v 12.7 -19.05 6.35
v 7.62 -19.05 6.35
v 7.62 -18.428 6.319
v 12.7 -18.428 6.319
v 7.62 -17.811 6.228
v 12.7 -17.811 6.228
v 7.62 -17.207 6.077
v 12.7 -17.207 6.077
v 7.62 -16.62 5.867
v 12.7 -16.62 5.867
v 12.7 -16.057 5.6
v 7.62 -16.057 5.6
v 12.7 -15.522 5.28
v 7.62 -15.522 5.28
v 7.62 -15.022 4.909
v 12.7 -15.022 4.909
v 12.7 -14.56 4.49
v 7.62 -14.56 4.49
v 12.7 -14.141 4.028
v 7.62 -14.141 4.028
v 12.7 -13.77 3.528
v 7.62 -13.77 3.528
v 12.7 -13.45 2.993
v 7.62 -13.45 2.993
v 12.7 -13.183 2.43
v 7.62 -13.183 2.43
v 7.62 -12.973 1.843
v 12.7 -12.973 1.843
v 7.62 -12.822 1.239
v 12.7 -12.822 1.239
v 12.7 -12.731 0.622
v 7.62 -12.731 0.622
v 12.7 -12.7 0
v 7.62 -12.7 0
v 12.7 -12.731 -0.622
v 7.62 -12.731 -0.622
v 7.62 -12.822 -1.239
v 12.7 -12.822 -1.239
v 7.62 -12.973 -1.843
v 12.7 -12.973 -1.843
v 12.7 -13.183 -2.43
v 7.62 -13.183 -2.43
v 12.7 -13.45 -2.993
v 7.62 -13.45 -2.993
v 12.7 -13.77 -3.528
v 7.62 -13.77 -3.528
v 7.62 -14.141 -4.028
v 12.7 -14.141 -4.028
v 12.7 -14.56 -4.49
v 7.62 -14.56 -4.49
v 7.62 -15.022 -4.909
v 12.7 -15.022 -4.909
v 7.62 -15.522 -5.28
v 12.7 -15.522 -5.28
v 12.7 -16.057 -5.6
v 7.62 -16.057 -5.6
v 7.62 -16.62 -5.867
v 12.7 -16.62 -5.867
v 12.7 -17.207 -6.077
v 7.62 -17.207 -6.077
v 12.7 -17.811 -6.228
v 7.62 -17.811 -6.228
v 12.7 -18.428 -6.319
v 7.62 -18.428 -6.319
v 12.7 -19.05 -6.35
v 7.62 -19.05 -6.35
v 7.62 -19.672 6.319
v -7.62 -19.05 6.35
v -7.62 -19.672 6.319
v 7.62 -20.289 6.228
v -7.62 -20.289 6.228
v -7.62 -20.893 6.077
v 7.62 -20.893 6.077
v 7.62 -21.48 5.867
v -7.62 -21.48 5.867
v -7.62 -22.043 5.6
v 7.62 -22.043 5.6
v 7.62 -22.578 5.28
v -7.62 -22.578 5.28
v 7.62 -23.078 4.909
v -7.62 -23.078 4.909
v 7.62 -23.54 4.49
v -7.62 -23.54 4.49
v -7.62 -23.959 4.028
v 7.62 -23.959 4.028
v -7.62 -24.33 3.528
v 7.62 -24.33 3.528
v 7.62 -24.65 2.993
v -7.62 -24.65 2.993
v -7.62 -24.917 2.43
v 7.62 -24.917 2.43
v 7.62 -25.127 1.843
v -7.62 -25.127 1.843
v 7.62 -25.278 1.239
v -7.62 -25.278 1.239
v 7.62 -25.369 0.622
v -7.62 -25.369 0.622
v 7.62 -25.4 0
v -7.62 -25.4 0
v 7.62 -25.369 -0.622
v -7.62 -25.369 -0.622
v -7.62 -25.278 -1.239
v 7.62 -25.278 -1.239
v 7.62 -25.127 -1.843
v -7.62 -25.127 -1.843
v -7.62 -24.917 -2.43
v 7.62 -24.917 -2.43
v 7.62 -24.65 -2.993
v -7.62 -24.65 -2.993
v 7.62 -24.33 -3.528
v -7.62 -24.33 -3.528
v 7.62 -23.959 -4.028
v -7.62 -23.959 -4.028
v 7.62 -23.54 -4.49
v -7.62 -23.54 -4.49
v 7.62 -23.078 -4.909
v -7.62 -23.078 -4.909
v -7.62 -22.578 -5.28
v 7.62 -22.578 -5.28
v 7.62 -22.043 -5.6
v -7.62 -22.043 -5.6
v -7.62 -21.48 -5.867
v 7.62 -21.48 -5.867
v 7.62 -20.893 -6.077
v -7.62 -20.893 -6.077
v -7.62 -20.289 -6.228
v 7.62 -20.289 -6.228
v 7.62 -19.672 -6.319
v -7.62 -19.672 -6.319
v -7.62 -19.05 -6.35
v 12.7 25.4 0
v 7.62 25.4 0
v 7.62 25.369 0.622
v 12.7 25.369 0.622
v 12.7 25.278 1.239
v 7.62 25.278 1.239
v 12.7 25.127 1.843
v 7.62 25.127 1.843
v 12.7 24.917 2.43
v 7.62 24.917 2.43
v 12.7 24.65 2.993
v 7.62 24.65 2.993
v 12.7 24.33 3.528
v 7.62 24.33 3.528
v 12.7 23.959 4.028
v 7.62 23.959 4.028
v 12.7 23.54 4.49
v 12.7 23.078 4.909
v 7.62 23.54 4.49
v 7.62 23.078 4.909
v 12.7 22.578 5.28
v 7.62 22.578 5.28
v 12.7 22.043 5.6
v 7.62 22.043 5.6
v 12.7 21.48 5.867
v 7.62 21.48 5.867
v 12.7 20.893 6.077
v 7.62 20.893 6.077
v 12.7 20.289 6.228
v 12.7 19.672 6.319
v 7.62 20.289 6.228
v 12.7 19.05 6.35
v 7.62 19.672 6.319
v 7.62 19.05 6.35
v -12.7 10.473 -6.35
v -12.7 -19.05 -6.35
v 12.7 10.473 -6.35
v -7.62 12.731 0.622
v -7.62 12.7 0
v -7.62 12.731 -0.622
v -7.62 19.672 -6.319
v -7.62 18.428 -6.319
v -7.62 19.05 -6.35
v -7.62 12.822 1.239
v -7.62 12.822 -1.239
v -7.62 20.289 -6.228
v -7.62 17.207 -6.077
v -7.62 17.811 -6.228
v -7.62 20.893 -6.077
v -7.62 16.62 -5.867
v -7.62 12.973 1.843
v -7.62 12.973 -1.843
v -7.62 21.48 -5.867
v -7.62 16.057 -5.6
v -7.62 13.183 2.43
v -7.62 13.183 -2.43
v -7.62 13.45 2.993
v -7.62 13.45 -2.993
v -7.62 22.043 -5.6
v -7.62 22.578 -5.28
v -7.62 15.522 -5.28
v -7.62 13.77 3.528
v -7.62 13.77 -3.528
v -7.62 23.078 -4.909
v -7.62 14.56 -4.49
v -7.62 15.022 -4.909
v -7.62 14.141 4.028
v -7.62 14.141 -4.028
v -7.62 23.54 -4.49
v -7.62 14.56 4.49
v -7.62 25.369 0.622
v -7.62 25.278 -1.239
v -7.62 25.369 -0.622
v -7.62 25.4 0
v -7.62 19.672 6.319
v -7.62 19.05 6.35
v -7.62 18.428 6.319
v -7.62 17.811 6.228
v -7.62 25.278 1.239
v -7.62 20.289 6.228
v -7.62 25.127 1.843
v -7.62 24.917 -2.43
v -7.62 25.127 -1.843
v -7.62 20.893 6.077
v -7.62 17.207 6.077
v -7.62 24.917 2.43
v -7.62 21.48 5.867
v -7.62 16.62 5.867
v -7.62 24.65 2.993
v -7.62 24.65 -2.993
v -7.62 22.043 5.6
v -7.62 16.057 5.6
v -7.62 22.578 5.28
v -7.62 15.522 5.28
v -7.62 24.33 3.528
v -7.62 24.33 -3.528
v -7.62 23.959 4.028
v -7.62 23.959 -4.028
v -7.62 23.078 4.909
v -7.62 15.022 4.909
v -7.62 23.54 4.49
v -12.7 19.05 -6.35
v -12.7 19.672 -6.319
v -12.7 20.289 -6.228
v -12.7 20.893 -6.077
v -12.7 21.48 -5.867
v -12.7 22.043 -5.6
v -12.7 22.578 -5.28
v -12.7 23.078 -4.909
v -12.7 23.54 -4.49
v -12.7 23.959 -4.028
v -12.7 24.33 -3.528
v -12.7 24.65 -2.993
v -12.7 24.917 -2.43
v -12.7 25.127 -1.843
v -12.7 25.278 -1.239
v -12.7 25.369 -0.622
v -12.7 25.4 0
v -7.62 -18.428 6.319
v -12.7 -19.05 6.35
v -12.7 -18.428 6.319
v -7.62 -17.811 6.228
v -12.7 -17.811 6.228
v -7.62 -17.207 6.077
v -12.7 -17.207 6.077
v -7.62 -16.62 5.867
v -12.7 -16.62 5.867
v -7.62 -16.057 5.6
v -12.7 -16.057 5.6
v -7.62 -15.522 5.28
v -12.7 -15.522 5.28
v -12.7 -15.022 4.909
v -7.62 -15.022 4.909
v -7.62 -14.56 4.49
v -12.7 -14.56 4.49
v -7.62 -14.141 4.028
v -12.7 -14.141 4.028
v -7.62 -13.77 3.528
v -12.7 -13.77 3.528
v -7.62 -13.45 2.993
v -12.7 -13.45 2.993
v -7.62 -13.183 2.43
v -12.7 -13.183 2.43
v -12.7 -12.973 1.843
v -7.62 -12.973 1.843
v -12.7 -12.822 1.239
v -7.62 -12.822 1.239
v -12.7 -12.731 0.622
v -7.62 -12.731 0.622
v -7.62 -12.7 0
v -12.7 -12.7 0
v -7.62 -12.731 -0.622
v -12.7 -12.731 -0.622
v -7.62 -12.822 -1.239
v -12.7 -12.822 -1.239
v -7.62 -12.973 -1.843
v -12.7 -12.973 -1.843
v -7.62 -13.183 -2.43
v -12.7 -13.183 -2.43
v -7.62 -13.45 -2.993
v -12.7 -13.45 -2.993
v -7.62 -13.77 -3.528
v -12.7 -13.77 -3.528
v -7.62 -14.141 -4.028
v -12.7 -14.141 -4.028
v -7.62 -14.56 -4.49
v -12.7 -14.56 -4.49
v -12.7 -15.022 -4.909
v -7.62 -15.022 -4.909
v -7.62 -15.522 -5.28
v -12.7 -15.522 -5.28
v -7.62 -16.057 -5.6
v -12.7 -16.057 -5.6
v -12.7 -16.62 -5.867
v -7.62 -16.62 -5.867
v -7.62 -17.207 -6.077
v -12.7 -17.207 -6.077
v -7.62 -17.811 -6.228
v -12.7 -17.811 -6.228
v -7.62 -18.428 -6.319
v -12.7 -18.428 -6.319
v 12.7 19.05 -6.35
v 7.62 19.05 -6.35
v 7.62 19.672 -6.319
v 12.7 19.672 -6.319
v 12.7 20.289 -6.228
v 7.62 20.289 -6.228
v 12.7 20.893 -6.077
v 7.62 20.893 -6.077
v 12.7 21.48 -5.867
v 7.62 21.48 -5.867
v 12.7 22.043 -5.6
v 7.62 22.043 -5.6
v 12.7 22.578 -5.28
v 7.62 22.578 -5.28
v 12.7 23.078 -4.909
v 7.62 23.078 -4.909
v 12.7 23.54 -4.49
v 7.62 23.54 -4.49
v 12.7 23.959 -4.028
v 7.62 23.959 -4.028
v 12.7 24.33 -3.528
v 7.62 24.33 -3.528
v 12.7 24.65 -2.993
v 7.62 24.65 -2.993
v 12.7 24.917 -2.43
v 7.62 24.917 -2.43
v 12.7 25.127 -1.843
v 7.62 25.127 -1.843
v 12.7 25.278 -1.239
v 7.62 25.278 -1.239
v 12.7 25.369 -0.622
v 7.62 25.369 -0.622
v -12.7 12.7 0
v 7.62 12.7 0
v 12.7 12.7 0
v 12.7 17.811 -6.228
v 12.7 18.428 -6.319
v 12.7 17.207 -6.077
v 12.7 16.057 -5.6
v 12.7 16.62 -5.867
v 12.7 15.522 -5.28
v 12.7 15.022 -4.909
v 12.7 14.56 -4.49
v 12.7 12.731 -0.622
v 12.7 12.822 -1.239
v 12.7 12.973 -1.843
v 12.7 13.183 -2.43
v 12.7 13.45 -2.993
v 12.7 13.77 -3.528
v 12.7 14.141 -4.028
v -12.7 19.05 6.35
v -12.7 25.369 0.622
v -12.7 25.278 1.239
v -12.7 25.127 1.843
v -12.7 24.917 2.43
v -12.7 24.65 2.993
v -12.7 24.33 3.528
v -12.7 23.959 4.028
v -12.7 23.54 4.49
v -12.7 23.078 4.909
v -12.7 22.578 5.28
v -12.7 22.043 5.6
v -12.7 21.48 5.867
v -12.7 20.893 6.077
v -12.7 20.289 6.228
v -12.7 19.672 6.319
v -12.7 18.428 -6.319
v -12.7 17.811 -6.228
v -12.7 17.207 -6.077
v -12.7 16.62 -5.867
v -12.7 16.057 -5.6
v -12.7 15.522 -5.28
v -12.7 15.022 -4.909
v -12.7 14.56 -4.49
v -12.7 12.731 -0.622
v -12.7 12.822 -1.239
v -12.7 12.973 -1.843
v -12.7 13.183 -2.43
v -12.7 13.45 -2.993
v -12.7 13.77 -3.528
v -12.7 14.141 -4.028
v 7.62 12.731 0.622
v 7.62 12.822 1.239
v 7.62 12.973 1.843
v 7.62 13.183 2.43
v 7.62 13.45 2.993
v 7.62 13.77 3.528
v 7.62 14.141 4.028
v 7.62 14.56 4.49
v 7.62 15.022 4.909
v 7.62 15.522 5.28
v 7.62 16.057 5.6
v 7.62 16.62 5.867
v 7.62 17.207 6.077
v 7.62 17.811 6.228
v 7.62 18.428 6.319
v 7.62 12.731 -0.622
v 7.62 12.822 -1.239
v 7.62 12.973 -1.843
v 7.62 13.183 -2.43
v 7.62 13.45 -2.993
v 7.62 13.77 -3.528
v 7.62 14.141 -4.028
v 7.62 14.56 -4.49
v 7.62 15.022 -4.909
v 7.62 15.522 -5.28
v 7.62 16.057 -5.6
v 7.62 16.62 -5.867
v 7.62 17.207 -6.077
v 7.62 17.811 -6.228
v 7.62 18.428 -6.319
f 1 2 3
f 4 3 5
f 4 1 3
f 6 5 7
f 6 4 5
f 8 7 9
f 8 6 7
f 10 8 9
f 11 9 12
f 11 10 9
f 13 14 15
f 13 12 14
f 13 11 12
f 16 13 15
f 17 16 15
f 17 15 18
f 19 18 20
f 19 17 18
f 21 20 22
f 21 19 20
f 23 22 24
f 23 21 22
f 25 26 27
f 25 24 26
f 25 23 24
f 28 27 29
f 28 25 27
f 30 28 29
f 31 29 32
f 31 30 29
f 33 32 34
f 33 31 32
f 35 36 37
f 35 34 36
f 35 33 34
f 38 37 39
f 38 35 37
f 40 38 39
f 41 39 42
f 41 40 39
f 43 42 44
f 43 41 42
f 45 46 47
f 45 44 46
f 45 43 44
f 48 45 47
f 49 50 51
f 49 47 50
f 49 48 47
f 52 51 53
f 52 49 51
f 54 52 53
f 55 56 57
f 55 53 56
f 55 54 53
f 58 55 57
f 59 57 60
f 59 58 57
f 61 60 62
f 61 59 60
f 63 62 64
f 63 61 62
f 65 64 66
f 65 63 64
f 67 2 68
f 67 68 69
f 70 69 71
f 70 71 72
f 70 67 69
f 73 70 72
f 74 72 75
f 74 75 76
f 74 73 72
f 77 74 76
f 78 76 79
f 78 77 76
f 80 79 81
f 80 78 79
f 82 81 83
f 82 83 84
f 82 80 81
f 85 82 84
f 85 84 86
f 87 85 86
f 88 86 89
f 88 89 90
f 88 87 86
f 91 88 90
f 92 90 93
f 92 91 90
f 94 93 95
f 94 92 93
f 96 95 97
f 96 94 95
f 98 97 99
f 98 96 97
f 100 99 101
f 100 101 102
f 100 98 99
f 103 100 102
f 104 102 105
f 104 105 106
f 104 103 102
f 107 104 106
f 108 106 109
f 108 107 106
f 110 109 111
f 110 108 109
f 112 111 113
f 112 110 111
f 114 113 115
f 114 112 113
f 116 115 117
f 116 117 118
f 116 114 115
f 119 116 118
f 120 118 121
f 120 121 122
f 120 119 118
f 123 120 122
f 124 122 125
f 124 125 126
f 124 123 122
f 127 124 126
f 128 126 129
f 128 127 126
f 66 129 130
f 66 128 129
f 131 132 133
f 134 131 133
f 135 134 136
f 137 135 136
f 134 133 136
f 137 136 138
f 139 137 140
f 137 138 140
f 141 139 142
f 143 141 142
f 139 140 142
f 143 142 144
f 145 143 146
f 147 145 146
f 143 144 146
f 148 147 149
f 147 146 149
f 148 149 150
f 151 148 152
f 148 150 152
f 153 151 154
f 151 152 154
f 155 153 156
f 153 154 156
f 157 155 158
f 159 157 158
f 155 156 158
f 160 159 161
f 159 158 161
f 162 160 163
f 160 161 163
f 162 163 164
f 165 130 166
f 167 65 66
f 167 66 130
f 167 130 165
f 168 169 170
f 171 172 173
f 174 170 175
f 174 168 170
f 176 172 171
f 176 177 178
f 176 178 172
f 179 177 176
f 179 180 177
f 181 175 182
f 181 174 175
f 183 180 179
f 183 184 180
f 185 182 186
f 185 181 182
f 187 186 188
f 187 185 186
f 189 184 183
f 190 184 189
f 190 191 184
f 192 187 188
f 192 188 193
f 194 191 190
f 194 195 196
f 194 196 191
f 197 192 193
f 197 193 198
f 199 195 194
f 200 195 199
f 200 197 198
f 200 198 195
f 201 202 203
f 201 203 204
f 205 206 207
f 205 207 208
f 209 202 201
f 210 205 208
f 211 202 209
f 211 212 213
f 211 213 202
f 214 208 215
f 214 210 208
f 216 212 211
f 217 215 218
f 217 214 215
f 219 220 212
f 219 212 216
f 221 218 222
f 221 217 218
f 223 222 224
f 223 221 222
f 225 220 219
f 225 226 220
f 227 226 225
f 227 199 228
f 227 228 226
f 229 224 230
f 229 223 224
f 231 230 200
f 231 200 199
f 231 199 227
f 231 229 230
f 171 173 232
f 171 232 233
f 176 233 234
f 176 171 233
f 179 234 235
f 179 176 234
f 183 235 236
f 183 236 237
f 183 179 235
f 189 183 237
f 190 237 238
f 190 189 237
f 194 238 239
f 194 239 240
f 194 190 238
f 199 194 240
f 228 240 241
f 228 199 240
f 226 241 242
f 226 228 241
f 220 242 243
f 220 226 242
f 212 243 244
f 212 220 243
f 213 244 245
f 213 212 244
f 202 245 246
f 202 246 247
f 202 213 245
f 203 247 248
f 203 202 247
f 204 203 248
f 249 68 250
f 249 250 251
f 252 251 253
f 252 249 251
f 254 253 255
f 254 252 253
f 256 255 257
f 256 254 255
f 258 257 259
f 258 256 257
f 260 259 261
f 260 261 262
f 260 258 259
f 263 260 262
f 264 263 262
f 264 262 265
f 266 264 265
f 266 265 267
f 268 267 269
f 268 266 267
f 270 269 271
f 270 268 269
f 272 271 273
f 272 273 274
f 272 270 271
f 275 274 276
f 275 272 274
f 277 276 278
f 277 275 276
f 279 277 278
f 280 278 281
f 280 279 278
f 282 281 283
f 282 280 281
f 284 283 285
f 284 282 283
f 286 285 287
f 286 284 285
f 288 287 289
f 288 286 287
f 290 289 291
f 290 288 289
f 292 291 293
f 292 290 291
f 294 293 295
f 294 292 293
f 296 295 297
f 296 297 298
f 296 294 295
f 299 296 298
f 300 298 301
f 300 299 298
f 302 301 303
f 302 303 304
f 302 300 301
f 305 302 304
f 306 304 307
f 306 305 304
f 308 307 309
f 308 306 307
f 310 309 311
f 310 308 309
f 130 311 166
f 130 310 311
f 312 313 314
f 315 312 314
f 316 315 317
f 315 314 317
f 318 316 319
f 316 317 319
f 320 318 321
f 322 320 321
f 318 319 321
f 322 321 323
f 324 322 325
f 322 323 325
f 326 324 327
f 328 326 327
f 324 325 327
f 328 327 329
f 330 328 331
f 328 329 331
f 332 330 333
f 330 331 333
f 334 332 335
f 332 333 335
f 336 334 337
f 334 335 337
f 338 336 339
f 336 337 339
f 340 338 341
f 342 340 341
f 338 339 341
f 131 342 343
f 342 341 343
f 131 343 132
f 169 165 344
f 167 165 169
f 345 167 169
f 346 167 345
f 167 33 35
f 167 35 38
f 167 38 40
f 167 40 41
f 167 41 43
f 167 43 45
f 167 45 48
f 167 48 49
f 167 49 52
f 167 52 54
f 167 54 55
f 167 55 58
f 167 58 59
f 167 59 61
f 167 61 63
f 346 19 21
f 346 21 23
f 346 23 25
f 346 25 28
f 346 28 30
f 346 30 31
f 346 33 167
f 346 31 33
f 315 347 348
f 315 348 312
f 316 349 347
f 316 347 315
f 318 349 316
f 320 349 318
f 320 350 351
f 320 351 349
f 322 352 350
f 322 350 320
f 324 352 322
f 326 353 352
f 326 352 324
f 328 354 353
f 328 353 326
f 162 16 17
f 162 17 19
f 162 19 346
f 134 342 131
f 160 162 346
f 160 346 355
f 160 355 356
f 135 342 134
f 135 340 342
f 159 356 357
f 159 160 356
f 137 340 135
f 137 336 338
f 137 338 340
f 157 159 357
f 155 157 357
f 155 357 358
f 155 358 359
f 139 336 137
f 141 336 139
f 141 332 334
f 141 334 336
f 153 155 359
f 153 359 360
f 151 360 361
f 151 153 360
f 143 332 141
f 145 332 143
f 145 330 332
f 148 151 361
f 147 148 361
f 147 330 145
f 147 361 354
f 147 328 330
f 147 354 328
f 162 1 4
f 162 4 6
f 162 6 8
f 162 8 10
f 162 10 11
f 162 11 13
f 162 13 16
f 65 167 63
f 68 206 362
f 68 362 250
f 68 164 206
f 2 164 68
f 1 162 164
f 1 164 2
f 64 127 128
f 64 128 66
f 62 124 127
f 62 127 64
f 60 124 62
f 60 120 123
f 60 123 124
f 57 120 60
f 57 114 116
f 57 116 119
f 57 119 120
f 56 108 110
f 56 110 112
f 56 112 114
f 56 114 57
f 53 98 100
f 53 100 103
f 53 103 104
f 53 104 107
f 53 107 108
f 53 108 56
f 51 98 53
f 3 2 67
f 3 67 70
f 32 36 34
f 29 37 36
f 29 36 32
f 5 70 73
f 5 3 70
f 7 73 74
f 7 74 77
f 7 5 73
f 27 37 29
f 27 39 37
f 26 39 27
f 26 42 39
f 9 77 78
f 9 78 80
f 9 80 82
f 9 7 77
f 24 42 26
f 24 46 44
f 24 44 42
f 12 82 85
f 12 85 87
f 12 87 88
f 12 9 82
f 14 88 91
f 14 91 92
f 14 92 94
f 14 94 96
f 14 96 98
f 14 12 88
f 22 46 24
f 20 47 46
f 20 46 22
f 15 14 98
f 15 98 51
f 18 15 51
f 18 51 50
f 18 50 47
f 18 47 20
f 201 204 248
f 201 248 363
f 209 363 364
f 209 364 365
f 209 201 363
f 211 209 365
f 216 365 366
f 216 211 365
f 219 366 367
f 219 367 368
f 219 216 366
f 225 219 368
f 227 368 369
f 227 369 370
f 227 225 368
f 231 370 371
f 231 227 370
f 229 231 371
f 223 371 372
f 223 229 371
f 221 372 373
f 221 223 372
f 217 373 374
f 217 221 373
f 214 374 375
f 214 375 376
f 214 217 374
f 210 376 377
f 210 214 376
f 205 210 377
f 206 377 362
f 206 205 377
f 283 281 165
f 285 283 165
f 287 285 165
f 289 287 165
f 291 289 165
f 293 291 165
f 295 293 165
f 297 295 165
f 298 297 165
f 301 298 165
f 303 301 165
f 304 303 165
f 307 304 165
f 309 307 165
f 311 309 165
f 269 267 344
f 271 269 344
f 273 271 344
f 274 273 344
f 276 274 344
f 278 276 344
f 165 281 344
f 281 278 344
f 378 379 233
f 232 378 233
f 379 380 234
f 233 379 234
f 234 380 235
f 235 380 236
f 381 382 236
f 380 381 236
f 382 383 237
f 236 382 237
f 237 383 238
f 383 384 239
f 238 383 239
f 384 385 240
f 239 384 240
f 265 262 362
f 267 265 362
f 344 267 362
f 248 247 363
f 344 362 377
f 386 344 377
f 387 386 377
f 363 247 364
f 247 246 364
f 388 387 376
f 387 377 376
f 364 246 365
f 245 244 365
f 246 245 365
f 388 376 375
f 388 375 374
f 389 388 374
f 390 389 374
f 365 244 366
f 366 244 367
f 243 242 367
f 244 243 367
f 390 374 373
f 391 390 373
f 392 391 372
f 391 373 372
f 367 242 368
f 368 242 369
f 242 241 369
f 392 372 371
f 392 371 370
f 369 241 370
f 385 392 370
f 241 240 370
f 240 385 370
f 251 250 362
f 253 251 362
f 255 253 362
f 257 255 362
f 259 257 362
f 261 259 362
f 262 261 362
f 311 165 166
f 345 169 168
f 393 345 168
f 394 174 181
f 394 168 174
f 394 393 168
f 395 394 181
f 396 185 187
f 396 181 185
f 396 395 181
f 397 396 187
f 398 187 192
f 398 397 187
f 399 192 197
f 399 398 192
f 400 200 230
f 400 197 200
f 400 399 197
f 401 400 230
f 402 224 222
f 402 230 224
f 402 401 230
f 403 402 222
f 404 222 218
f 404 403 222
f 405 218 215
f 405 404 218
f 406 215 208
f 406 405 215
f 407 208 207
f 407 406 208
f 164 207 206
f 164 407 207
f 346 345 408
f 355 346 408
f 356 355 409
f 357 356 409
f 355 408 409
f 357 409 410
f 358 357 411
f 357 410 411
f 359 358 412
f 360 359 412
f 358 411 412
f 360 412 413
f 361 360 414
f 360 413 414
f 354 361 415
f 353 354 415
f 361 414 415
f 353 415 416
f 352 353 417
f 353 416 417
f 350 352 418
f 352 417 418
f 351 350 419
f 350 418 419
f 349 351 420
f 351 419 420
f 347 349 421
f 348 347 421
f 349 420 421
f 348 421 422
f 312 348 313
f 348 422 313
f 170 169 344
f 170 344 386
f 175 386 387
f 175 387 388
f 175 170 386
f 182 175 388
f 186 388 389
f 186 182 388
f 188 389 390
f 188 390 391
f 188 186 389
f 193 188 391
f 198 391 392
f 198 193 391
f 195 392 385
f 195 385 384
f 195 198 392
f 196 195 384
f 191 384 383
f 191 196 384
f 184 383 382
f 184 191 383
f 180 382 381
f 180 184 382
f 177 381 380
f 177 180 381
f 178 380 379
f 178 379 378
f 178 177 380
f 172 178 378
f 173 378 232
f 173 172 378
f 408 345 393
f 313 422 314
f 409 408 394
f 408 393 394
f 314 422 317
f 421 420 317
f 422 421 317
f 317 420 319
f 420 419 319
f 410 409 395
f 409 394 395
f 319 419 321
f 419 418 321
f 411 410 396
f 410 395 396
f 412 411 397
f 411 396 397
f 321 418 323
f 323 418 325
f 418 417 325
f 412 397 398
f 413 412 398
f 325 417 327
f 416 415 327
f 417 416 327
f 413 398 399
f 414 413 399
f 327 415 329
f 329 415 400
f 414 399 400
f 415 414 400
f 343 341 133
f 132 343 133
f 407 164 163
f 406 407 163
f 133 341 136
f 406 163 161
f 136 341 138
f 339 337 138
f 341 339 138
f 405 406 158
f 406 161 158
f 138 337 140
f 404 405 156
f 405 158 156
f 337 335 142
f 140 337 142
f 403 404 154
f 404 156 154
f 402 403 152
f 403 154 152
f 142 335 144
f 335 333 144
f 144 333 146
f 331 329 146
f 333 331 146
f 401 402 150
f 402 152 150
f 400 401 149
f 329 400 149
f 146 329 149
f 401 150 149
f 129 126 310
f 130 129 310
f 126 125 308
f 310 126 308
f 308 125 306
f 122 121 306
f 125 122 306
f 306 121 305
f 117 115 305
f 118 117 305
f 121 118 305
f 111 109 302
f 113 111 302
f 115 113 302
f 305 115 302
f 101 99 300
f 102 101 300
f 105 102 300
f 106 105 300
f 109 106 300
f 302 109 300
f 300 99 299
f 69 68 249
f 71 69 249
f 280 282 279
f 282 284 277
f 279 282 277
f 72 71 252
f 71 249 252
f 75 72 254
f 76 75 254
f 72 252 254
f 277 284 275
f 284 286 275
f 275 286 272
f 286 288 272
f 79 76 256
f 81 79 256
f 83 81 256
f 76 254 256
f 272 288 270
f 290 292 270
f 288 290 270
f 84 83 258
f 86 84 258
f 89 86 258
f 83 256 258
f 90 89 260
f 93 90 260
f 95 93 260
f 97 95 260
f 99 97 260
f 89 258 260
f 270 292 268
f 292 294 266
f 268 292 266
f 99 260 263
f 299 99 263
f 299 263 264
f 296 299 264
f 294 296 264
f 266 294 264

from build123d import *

# Parameters (mm, degrees)
F1_DEPTH = 12.7
F2_START = 7.62
F2_DEPTH = 5.08
F3_START = -7.62
F3_DEPTH = 5.08
F4_DEPTH = 7.62


with BuildPart() as f1:
    # F0 (on Right) → F1 (new body, symmetric)
    with BuildSketch(Plane.YZ):
        with BuildLine():
            ThreePointArc((12.7, 0), (14.5598719395, 4.4901280605), (19.05, 6.35))
            Line((19.05, 6.35), (-19.05, 6.35))
            ThreePointArc((-19.05, 6.35), (-14.5598719395, 4.4901280605), (-12.7, 0))
            ThreePointArc((-12.7, 0), (-14.5598719395, -4.4901280605), (-19.05, -6.35))
            Line((-19.05, -6.35), (10.4731516913, -6.35))
            Line((10.4731516913, -6.35), (12.7, 0))
        make_face()
    extrude(amount=F1_DEPTH, both=True)

    # F0 (on Right) → F2 (join)
    with BuildSketch(Plane.YZ.offset(F2_START)):
        with BuildLine():
            ThreePointArc((25.4, 0), (23.5401280605, 4.4901280605), (19.05, 6.35))
            Line((19.05, 6.35), (19.05, -6.35))
            ThreePointArc((19.05, -6.35), (23.5401280605, -4.4901280605), (25.4, 0))
        make_face()
        with BuildLine():
            Line((19.05, -6.35), (19.05, 6.35))
            ThreePointArc((19.05, 6.35), (14.5598719395, 4.4901280605), (12.7, 0))
            ThreePointArc((12.7, 0), (14.5598719395, -4.4901280605), (19.05, -6.35))
        make_face()
    extrude(amount=F2_DEPTH)

    # F0 (on Right) → F3 (join)
    with BuildSketch(Plane.YZ.offset(F3_START)):
        with BuildLine():
            ThreePointArc((25.4, 0), (23.5401280605, 4.4901280605), (19.05, 6.35))
            Line((19.05, 6.35), (19.05, -6.35))
            ThreePointArc((19.05, -6.35), (23.5401280605, -4.4901280605), (25.4, 0))
        make_face()
        with BuildLine():
            Line((19.05, -6.35), (19.05, 6.35))
            ThreePointArc((19.05, 6.35), (14.5598719395, 4.4901280605), (12.7, 0))
            ThreePointArc((12.7, 0), (14.5598719395, -4.4901280605), (19.05, -6.35))
        make_face()
    extrude(amount=-F3_DEPTH)

    # F0 (on Right) → F4 (join, symmetric)
    with BuildSketch(Plane.YZ):
        with BuildLine():
            ThreePointArc((-12.7, 0), (-14.5598719395, 4.4901280605), (-19.05, 6.35))
            Line((-19.05, 6.35), (-19.05, -6.35))
            ThreePointArc((-19.05, -6.35), (-14.5598719395, -4.4901280605), (-12.7, 0))
        make_face()
        with BuildLine():
            Line((-19.05, -6.35), (-19.05, 6.35))
            ThreePointArc((-19.05, 6.35), (-25.4, 0), (-19.05, -6.35))
        make_face()
    extrude(amount=F4_DEPTH, both=True)


solid = f1.part
